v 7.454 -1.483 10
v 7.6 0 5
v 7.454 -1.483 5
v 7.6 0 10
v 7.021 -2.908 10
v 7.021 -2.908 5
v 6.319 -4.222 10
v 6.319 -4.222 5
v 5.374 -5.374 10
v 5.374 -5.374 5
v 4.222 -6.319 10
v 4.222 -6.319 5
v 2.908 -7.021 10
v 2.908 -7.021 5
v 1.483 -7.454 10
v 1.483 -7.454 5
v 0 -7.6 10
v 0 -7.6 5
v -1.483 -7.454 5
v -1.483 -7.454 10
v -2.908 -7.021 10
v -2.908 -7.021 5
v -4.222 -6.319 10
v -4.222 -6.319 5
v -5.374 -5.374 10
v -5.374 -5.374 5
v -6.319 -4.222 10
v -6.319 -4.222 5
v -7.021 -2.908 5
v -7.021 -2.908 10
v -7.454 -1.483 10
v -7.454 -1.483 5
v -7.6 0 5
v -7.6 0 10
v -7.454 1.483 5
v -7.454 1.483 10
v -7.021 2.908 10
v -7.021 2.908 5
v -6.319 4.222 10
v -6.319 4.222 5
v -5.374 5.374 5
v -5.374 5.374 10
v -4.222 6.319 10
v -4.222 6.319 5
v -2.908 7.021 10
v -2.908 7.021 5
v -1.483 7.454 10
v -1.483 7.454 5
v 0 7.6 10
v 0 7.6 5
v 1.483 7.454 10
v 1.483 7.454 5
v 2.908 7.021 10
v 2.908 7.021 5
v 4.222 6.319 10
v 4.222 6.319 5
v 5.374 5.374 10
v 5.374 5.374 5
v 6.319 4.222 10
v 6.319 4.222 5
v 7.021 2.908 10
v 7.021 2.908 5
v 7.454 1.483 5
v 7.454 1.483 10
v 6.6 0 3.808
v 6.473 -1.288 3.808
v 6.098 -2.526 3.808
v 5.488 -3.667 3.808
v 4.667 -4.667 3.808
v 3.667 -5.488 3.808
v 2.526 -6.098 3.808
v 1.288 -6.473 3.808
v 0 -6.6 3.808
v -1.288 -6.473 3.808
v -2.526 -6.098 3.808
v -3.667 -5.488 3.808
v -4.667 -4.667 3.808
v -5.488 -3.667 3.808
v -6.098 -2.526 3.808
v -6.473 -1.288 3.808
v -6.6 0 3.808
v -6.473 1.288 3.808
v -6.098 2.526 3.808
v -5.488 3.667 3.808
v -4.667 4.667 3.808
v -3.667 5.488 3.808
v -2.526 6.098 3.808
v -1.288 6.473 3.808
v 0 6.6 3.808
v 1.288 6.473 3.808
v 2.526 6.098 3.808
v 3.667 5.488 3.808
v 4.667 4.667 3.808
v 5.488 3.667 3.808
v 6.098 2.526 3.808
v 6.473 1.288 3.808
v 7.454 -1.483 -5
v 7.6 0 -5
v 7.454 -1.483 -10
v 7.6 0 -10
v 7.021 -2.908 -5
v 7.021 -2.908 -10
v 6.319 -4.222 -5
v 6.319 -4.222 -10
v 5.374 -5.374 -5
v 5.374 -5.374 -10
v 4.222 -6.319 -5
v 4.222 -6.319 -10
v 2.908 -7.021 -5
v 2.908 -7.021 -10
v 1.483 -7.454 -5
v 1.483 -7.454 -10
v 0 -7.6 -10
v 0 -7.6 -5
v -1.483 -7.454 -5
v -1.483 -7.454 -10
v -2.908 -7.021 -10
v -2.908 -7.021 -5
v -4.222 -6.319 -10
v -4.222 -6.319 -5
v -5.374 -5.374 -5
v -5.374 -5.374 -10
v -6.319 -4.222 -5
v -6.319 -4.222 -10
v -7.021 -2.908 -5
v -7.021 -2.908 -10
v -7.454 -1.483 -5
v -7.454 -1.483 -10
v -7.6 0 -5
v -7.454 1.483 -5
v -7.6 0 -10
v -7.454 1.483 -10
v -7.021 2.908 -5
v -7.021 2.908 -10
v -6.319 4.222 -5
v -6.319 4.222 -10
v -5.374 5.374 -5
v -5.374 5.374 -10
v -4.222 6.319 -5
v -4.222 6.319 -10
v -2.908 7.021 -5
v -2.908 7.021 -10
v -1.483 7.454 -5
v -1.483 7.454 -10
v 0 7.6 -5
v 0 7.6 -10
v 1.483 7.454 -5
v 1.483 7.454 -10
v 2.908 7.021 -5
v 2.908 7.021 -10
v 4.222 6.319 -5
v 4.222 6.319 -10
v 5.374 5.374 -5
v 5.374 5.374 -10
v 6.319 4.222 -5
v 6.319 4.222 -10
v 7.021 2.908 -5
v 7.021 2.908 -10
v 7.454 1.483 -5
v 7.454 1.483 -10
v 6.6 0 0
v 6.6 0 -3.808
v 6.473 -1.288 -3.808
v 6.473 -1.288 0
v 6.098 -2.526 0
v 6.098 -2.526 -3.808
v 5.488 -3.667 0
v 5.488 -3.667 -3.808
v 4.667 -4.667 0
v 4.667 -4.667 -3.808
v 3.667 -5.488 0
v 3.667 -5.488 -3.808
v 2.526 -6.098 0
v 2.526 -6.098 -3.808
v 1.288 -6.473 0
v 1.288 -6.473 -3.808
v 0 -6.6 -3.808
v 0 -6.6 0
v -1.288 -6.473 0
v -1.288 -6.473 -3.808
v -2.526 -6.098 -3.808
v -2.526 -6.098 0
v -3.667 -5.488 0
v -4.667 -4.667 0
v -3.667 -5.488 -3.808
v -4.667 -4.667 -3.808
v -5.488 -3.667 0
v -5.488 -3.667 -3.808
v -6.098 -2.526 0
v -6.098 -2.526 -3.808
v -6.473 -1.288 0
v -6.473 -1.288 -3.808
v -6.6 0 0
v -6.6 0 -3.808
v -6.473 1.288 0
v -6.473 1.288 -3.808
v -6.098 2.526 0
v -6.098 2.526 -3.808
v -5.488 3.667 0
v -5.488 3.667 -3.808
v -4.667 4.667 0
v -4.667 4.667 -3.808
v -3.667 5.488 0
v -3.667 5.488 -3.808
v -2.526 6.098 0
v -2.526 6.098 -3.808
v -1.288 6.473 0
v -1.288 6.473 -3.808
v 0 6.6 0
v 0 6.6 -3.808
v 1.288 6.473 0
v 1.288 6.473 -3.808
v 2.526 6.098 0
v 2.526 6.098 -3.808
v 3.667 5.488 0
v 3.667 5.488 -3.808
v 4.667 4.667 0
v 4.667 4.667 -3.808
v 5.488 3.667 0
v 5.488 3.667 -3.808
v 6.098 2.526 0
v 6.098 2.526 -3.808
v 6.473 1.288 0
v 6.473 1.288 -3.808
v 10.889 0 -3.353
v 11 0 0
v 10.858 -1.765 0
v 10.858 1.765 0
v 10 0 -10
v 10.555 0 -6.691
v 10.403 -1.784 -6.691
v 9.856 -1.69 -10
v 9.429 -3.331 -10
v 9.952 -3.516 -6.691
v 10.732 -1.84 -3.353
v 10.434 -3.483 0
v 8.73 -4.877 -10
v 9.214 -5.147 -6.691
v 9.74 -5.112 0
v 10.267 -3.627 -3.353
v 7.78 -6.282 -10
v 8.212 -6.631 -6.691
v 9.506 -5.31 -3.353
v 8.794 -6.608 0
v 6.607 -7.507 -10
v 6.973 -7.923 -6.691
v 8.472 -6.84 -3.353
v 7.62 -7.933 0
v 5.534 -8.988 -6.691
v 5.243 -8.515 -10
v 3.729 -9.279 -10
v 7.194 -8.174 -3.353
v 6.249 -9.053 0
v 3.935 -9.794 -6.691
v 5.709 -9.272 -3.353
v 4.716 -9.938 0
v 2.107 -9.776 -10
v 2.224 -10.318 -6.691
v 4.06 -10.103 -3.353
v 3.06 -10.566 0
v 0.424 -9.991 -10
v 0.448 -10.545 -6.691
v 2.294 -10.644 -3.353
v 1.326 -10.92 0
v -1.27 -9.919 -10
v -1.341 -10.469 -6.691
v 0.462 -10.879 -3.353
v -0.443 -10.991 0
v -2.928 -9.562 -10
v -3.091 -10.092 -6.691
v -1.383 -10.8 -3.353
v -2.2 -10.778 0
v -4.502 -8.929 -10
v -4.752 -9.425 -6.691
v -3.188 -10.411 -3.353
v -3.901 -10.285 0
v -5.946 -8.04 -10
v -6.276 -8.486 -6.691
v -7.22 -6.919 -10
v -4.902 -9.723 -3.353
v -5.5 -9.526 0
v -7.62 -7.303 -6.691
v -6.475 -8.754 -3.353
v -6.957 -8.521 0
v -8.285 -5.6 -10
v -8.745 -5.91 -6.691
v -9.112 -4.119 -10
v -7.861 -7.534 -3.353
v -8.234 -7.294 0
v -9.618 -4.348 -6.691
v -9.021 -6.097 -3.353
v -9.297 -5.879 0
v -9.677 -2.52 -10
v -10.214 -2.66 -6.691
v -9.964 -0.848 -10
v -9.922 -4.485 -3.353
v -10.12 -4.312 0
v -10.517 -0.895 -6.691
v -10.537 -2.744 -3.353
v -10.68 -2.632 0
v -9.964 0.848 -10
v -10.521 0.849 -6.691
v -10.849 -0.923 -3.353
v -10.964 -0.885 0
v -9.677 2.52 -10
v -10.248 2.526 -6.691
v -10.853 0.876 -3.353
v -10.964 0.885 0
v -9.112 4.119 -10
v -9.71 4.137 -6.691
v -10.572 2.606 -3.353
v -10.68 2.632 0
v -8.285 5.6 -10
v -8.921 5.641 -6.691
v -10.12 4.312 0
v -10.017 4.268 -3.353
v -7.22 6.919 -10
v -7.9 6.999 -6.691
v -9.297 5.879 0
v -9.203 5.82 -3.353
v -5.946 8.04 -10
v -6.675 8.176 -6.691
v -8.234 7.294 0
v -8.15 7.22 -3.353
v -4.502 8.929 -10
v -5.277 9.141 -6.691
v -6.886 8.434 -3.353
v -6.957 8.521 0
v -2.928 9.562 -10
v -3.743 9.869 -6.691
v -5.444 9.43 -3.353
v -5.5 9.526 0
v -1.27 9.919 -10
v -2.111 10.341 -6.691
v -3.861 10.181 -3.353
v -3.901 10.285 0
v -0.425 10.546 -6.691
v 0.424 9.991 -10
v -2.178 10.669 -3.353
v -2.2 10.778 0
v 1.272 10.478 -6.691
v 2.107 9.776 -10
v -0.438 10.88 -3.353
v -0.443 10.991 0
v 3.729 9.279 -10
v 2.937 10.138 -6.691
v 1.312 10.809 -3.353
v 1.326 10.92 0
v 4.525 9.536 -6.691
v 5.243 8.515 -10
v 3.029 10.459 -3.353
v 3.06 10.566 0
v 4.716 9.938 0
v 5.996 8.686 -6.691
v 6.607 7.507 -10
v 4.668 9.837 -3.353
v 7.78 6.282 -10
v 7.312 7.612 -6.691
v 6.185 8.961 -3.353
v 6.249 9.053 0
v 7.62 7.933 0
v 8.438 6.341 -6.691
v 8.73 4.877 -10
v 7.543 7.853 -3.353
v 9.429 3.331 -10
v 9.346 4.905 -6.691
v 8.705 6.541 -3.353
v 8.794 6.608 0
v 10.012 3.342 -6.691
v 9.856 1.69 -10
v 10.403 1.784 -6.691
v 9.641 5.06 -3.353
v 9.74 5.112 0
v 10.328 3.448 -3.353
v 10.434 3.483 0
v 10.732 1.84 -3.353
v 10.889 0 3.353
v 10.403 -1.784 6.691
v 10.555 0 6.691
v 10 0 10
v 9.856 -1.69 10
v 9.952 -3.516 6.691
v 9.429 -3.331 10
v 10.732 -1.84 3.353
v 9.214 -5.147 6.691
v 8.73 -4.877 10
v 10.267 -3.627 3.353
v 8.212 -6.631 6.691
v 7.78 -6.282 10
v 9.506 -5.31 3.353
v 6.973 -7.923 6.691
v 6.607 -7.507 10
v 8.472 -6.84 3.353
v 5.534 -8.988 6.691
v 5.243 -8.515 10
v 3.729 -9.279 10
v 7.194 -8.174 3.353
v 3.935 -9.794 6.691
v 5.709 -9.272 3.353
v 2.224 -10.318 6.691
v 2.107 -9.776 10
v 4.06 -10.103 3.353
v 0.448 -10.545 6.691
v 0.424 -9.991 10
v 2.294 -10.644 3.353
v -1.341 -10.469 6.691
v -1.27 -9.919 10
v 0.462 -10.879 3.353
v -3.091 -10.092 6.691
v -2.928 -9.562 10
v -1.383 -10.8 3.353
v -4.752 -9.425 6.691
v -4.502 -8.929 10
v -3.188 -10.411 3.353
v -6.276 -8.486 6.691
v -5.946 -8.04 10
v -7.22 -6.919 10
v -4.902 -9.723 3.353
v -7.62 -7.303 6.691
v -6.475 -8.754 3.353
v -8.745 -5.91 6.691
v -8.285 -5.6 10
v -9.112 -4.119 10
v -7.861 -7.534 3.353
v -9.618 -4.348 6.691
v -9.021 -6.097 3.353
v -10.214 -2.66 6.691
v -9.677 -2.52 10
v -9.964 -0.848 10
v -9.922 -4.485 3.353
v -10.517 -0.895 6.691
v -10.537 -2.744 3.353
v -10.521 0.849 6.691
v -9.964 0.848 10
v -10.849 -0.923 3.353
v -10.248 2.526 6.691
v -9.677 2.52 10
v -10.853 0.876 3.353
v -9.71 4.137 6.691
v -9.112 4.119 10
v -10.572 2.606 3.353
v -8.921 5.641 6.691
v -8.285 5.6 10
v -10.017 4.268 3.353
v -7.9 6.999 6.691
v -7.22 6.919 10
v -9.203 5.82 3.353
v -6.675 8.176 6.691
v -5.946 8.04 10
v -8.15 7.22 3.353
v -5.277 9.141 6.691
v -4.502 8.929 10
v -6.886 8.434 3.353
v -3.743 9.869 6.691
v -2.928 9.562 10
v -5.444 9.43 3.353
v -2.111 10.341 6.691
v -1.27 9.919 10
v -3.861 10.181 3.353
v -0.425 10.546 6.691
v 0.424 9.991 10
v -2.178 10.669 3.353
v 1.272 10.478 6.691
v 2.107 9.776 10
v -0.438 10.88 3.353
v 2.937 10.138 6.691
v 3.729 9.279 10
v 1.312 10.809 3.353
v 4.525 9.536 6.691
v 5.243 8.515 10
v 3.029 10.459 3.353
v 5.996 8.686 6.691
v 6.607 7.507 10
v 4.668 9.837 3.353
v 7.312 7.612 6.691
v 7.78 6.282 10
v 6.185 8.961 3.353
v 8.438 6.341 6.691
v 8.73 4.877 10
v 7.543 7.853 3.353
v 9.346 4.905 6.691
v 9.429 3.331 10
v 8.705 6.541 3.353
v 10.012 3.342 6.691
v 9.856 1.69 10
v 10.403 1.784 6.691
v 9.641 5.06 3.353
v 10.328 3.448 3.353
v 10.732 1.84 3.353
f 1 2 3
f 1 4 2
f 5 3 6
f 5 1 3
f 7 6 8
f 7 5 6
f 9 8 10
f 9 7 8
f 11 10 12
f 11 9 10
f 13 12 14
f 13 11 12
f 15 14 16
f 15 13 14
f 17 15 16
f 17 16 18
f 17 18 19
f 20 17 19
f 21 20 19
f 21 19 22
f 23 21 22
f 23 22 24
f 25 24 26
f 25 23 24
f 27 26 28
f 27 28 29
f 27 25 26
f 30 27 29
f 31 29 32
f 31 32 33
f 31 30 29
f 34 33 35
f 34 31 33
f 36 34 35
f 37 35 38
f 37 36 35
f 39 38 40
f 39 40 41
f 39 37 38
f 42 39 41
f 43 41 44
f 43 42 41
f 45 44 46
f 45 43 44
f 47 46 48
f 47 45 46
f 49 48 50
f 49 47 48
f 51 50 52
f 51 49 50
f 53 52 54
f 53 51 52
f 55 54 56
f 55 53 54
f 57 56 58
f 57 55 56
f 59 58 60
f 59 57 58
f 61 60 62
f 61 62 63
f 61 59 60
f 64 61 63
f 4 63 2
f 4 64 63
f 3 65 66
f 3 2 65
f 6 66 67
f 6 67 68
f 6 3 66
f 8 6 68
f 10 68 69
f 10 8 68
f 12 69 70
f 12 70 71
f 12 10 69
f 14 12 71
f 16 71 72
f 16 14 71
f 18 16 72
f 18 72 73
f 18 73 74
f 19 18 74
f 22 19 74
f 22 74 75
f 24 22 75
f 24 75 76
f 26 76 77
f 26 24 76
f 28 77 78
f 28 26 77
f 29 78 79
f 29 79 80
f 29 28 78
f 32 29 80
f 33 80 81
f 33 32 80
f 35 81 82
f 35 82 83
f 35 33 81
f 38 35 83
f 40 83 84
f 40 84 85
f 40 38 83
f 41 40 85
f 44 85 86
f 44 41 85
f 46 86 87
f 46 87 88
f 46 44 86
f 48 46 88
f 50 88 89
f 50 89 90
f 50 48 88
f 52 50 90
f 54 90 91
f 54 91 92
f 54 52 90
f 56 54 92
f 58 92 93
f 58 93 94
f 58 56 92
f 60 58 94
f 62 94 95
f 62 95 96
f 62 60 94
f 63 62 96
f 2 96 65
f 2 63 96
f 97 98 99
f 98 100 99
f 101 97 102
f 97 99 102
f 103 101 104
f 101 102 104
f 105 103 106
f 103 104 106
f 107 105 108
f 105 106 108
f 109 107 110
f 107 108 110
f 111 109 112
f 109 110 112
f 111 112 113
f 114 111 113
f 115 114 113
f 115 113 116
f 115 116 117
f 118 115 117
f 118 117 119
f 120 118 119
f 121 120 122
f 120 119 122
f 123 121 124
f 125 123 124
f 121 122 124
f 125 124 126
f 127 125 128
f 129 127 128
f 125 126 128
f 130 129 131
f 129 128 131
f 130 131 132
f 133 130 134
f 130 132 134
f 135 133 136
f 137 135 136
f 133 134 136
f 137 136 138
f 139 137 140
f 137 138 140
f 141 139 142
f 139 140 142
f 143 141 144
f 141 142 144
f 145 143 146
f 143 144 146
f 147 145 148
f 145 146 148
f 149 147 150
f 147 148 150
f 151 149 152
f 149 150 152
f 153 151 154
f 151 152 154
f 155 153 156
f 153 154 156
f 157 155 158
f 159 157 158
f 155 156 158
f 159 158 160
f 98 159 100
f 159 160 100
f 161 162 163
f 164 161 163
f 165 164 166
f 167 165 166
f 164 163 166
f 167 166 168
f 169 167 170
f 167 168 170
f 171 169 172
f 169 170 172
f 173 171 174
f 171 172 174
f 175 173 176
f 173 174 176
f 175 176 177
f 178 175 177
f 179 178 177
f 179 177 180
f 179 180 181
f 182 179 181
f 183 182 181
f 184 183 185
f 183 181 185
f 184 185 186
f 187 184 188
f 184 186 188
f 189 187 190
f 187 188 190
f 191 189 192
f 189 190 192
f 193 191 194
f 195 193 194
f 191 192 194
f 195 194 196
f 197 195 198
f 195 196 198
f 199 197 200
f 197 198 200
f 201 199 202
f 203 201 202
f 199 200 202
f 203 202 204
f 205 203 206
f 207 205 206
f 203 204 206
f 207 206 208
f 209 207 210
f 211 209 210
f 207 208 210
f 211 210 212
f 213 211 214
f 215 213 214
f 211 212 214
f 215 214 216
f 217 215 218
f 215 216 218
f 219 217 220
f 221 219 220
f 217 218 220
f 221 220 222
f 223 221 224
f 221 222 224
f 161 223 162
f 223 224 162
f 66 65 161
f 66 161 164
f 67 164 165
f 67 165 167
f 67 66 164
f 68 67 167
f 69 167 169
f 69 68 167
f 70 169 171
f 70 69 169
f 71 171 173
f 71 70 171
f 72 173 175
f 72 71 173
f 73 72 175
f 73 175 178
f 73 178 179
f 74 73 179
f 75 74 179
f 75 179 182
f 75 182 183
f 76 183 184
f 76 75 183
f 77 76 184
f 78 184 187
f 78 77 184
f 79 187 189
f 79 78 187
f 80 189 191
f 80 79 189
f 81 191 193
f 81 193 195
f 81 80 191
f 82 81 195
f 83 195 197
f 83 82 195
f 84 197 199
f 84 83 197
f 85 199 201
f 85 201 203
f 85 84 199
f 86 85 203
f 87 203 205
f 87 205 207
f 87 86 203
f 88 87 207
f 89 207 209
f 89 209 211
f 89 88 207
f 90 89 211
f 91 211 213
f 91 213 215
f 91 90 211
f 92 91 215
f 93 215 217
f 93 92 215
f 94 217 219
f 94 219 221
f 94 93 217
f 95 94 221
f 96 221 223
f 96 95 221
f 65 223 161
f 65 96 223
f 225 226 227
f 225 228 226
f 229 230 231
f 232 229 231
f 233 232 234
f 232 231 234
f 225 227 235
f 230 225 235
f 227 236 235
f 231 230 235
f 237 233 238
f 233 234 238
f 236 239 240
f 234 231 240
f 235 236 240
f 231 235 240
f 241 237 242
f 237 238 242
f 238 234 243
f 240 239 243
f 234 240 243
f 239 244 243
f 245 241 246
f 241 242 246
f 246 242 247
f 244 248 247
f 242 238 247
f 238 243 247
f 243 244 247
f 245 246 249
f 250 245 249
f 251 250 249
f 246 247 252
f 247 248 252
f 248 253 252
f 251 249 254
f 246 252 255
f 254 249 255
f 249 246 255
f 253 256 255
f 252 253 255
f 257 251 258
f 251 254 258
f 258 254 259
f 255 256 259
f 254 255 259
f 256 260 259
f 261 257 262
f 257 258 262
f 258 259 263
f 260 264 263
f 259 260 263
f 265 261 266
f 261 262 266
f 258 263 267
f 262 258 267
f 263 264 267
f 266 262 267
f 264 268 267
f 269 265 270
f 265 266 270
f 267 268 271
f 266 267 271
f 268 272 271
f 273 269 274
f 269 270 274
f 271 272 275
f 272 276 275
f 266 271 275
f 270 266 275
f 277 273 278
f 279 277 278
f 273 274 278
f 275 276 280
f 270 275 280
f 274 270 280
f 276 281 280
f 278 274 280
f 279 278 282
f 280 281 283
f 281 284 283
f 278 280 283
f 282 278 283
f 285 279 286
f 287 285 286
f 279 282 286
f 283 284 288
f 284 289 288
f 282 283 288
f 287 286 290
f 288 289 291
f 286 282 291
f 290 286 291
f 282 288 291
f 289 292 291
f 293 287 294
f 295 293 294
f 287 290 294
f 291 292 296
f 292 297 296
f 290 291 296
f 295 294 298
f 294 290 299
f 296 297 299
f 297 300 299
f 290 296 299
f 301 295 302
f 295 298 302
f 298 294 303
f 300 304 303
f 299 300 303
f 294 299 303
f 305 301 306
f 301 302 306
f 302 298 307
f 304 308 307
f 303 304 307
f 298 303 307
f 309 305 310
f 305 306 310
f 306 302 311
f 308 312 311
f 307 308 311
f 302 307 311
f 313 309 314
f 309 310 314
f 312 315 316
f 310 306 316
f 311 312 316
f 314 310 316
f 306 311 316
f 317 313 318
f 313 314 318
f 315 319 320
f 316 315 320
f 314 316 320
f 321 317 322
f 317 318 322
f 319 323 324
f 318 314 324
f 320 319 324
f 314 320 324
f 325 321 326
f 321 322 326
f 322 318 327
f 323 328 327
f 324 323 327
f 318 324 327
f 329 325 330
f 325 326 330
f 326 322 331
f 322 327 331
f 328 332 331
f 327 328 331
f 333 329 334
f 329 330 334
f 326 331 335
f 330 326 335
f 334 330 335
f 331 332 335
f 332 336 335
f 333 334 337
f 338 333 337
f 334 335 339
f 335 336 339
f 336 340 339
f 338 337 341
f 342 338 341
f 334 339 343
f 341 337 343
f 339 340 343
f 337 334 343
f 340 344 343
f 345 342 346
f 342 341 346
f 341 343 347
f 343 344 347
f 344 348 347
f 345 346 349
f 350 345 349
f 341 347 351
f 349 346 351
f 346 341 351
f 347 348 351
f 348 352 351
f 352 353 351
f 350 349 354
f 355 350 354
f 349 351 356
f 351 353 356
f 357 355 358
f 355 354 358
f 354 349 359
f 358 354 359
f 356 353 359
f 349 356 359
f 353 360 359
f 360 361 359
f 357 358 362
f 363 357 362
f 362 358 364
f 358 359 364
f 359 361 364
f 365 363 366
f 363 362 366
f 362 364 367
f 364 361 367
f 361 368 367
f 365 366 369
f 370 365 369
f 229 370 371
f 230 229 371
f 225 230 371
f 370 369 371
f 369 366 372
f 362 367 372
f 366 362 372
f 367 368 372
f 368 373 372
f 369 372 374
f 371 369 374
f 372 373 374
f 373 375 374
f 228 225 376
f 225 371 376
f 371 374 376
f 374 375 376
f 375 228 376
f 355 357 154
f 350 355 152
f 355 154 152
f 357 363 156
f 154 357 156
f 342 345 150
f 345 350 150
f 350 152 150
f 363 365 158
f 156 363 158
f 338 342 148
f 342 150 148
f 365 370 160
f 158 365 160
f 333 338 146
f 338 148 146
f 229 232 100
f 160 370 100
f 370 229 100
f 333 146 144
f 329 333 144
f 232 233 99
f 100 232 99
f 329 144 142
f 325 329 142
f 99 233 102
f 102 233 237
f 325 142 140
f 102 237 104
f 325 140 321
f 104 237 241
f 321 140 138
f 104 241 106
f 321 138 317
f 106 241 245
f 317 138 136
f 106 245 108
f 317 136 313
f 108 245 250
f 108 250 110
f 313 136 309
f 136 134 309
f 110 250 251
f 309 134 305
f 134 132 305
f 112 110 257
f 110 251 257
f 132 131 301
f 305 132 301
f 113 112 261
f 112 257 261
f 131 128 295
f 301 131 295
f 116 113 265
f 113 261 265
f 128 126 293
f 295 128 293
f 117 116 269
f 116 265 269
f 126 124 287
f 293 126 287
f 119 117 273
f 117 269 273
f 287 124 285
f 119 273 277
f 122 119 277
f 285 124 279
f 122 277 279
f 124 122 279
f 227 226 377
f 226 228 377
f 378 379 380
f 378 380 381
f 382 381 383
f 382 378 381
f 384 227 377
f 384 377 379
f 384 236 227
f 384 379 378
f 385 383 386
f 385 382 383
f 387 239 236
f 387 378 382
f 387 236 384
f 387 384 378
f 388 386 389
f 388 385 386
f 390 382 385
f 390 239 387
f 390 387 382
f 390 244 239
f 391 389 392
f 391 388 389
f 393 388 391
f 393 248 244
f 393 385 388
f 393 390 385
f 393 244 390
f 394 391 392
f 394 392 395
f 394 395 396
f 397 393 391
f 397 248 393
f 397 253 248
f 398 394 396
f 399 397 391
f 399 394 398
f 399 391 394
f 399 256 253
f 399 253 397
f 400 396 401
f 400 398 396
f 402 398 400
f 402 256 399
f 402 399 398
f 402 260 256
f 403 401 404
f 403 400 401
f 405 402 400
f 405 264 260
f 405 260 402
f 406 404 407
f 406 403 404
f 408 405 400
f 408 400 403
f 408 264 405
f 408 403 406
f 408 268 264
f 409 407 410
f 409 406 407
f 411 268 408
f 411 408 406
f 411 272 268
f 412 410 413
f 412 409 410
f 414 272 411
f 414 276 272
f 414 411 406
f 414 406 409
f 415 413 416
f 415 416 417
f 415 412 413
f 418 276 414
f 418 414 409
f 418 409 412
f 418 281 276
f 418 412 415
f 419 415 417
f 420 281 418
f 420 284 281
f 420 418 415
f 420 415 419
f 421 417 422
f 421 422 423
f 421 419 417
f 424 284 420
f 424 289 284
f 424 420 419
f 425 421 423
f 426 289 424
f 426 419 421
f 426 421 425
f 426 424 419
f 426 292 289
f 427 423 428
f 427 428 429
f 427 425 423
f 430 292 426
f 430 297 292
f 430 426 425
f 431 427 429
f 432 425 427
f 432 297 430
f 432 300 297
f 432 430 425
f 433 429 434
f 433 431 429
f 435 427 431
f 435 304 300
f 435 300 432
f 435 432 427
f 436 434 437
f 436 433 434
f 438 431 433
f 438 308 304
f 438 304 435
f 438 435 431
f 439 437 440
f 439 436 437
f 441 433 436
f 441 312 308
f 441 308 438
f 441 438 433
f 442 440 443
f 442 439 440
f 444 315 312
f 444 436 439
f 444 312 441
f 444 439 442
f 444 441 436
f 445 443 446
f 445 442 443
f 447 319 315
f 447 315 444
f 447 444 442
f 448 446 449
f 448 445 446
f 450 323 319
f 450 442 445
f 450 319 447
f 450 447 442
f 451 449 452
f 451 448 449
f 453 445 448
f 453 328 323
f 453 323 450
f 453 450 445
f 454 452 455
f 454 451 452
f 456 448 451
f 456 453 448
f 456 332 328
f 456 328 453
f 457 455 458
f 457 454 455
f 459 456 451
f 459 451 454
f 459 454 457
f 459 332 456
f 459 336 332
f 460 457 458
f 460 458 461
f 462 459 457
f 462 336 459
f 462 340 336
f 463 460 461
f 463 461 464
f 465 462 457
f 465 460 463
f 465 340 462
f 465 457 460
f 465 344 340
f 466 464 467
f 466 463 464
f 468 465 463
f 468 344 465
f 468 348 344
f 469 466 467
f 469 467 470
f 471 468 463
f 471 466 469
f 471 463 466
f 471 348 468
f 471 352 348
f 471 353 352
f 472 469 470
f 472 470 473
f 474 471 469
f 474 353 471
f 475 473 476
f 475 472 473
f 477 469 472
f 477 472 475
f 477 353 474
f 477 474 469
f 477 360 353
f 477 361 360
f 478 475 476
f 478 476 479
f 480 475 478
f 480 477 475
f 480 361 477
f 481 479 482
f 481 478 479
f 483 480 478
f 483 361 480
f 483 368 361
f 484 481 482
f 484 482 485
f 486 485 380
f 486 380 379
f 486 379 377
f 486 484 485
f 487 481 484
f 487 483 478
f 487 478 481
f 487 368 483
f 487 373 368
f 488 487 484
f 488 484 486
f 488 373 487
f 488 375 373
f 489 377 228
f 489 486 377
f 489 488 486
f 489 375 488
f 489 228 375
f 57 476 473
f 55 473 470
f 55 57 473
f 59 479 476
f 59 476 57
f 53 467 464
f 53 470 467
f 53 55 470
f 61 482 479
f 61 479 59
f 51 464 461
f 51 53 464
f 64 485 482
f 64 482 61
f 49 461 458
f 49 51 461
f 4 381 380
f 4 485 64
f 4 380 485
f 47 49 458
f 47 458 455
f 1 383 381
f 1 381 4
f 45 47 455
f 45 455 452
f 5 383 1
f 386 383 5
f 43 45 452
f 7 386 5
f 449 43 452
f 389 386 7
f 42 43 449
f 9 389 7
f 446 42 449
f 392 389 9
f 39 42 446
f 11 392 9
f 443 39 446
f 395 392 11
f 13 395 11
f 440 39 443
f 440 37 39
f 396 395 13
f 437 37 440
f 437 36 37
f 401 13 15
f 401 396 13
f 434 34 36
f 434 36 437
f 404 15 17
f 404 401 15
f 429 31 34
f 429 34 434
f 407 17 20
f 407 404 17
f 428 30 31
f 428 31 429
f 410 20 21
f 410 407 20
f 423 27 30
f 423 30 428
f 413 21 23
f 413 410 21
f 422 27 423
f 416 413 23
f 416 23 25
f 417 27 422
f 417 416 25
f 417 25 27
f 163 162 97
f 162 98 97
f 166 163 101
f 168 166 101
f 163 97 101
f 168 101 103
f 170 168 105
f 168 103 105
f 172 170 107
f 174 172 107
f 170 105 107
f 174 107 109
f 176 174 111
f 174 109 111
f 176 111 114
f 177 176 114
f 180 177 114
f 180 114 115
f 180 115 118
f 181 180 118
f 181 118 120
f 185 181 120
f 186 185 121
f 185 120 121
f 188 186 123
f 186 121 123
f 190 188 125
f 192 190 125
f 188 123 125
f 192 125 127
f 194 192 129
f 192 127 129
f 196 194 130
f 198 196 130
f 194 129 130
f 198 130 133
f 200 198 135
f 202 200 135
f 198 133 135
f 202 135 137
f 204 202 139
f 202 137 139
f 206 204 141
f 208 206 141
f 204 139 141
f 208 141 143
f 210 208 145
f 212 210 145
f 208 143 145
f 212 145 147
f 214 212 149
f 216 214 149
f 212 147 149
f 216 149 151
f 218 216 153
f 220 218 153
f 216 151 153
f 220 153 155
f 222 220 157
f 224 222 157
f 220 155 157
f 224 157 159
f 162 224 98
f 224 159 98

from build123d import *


with BuildPart() as part:
    # Skizze4 → Rotation1 (revolve)
    with BuildSketch(Plane(origin=(0, 0, 0), x_dir=(0, 0, -1), z_dir=(1, 0, 0)), mode=Mode.PRIVATE) as rotation1_sk:
        with BuildLine():
            Line((0, 11), (0, 6.6))
            Line((0, 6.6), (3.808246407, 6.6))
            Line((3.808246407, 6.6), (5, 7.6))
            Line((5, 7.6), (10, 7.6))
            Line((10, 7.6), (10, 10))
            ThreePointArc((10, 10), (5.024937811, 10.749378106), (0, 11))
        make_face()
    revolve(rotation1_sk.sketch.rotate(Axis((0, 0, 10), (0, 0, -1)), 90), axis=Axis((0, 0, 10), (0, 0, -1)))

    # Spiegeln2: part across plane


with BuildPart() as part_1:
    add(part.part)
    add(part.part.mirror(Plane.XY))


solid = part_1.part
